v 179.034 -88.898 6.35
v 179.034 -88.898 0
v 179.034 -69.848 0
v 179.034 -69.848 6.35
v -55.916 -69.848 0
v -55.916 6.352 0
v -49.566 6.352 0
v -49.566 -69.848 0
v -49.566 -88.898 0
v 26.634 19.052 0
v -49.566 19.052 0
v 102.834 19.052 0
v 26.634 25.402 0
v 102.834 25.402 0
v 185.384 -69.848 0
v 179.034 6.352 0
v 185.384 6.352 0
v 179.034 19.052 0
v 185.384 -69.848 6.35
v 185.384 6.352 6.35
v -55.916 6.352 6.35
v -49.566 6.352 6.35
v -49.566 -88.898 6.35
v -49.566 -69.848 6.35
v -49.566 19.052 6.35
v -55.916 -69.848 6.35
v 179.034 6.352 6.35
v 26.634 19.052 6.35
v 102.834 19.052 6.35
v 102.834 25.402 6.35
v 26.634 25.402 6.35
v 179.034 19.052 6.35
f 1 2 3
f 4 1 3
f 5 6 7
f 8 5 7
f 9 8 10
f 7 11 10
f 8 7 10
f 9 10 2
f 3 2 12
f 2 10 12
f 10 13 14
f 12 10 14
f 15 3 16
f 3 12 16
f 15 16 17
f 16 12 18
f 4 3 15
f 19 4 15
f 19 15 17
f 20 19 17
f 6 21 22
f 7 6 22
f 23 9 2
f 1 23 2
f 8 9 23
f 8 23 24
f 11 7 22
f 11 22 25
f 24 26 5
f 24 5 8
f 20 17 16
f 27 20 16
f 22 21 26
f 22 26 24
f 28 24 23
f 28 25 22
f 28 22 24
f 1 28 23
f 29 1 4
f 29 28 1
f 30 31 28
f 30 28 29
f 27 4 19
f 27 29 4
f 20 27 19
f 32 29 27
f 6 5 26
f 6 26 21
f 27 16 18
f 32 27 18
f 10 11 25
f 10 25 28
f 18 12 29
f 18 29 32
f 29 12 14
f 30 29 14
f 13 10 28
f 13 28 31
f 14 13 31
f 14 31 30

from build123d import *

# Parameters (mm, degrees)
SKETCH1_W           = 228.6
SKETCH1_H           = 107.95
SKETCH1_W_2         = 76.2
SKETCH1_H_2         = 6.35
SKETCH1_W_3         = 6.35
SKETCH1_H_3         = 76.2
BOSS_EXTRUDE1_DEPTH = 6.35


with BuildPart() as part:
    # Sketch1 → Boss-Extrude1 (new body)
    with BuildSketch(Plane.XY):
        with Locations((64.733678216, -34.923106362)):
            Rectangle(SKETCH1_W, SKETCH1_H)
        with Locations((64.733678216, 22.226893638)):
            Rectangle(SKETCH1_W_2, SKETCH1_H_2)
        Polygon((185.383678216, -69.848106362), (185.383678216, 2.969008236), (185.383678216, 6.351893638), (179.033678216, 6.351893638), (179.033678216, -69.848106362), align=None)
        with Locations((-52.741321784, -31.748106362)):
            Rectangle(SKETCH1_W_3, SKETCH1_H_3)
    extrude(amount=BOSS_EXTRUDE1_DEPTH)


solid = part.part
